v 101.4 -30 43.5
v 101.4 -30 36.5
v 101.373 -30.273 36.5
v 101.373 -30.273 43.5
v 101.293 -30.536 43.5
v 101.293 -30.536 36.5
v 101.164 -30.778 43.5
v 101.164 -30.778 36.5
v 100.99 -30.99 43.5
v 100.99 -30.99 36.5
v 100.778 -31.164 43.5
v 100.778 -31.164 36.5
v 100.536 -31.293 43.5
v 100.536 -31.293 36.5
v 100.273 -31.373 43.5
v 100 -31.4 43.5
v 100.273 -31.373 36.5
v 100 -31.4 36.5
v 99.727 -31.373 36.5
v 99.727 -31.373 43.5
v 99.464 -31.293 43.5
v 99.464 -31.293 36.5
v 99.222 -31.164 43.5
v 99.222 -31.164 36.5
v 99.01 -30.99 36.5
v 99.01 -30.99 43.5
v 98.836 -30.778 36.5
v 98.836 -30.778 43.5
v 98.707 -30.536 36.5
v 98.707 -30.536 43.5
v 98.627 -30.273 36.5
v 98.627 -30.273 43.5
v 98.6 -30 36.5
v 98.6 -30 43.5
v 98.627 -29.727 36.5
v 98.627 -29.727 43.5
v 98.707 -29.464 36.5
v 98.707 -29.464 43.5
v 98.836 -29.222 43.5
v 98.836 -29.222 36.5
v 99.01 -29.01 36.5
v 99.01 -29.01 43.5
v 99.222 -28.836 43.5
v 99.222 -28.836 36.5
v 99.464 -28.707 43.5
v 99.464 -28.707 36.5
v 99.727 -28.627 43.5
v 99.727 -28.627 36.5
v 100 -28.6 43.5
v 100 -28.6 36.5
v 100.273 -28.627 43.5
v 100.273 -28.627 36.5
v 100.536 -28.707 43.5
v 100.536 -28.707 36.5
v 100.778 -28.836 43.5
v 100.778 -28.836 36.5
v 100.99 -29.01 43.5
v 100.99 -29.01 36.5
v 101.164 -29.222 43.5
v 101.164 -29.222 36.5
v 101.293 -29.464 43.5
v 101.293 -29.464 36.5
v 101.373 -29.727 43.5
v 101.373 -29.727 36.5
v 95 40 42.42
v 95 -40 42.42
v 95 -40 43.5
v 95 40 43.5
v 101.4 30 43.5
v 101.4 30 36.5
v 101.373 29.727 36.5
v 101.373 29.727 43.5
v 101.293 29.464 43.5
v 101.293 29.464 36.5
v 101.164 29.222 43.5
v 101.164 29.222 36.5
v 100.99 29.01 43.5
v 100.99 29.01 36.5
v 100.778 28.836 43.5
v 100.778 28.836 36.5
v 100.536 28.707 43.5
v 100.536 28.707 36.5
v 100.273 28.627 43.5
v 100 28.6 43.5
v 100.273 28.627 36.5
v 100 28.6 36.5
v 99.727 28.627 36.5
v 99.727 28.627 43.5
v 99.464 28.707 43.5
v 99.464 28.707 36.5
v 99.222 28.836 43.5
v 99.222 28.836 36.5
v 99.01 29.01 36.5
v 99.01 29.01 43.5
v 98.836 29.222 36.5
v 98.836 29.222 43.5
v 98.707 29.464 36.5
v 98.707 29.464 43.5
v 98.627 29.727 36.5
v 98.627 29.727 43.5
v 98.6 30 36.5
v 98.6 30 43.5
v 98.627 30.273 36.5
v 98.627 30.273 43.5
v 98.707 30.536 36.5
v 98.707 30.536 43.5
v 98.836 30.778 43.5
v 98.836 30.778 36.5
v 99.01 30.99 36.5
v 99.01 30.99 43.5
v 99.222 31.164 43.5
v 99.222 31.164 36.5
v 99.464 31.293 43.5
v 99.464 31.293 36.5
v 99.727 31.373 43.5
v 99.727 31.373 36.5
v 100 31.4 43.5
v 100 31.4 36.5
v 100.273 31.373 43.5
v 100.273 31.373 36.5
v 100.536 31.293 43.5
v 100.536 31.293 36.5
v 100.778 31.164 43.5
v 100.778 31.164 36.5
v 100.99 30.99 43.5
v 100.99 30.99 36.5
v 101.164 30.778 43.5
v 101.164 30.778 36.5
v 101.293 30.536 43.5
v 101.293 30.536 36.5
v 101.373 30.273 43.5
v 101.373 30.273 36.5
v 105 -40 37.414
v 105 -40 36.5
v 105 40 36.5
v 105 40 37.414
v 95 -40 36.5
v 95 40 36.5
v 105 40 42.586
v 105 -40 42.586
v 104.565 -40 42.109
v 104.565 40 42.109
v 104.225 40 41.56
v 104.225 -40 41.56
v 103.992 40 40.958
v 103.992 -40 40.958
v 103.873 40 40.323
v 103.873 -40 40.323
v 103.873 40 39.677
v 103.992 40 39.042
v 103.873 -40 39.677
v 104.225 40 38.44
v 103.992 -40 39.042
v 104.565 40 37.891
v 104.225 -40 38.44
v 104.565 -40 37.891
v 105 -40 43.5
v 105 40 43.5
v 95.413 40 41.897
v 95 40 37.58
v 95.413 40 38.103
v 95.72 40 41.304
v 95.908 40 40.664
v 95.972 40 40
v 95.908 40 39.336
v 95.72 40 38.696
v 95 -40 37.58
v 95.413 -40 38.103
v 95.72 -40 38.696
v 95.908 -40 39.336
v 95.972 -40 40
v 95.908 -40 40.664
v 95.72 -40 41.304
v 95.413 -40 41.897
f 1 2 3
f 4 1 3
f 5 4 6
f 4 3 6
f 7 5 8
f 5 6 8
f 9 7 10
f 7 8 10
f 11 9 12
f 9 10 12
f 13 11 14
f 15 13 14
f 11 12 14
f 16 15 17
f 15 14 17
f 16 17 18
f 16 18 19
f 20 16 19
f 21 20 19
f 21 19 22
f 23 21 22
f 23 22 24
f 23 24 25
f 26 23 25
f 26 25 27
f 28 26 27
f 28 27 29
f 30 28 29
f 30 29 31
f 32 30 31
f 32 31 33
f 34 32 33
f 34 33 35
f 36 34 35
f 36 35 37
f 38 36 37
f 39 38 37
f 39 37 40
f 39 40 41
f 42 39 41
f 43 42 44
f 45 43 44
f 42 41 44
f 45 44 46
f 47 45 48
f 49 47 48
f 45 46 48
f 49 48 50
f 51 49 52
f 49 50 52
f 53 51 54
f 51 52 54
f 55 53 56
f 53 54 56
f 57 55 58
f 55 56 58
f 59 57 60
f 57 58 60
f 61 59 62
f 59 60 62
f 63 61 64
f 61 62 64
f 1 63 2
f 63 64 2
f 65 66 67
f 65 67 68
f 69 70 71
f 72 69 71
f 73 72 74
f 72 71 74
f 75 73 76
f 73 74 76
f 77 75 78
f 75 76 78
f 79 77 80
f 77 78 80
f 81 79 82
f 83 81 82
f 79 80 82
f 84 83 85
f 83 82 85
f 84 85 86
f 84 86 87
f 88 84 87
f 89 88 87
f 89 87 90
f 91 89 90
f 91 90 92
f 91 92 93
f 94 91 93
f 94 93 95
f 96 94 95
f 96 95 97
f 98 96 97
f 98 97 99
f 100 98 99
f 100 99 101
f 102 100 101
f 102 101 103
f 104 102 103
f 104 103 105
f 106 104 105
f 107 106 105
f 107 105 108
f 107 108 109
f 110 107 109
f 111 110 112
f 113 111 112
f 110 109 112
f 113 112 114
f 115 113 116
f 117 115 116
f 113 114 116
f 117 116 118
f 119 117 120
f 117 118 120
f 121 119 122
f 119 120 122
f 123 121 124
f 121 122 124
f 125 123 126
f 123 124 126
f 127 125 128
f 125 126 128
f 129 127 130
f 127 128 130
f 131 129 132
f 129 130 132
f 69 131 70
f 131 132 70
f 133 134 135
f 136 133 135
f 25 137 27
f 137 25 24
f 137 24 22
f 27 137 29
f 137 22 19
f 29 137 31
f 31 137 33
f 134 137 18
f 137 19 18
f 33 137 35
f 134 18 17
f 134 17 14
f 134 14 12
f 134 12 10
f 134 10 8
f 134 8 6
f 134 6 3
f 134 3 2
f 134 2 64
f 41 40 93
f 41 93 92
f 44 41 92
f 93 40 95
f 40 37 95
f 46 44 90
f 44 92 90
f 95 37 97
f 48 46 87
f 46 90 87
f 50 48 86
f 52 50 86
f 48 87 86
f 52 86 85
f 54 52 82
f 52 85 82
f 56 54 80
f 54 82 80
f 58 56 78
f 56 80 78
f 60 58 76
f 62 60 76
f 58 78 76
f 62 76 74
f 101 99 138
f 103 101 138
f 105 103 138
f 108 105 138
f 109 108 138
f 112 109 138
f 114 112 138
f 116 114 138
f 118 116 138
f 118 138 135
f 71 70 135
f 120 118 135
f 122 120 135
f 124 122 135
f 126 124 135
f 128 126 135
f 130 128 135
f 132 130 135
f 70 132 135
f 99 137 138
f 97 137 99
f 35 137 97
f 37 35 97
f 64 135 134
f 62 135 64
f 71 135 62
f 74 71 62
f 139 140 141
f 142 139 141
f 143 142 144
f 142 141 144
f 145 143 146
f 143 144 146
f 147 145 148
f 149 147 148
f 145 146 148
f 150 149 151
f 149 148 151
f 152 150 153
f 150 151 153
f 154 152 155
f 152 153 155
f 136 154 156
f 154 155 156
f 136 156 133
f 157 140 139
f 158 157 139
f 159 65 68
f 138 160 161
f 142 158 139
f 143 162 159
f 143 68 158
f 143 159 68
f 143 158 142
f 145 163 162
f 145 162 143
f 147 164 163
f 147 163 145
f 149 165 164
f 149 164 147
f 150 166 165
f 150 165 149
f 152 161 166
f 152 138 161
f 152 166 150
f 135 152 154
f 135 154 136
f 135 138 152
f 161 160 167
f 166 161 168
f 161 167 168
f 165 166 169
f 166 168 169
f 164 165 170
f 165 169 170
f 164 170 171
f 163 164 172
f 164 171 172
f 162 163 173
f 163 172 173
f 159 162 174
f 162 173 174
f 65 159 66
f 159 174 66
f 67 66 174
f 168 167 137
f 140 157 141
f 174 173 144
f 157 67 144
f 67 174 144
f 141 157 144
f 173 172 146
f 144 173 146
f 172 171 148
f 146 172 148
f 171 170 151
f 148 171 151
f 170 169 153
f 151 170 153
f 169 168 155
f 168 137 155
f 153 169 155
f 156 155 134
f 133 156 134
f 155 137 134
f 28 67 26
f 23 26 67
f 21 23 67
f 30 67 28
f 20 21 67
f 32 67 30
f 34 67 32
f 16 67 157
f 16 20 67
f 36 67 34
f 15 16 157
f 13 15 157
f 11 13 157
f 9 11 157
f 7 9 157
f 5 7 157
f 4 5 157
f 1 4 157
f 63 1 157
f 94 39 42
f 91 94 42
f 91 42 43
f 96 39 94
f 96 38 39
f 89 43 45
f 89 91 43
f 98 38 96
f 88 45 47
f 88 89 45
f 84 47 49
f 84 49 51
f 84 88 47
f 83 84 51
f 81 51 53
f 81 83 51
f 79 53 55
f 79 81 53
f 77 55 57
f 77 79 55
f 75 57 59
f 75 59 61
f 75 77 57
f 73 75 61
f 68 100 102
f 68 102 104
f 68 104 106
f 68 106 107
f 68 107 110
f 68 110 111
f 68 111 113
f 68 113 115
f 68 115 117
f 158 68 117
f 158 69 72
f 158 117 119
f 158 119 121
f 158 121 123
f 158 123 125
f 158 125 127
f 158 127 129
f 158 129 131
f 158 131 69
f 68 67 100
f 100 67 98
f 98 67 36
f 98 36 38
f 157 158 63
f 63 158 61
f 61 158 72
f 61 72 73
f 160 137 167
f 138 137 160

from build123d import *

# Parameters (mm, degrees)
SKETCH045_W     = 10
SKETCH045_H     = 80
PAD018_DEPTH    = 7
SKETCH046_R     = 1.4
POCKET026_DEPTH = 8
SKETCH047_R     = 3.5
POCKET027_DEPTH = 80.001


with BuildPart() as part:
    # Sketch045 → Pad018 (new body)
    with BuildSketch(Plane.XY):
        with Locations((100, 0)):
            Rectangle(SKETCH045_W, SKETCH045_H)
    extrude(amount=PAD018_DEPTH)

    # Sketch046 (on Face5 of Pad018) → Pocket026 (cut)
    with BuildSketch(Plane(origin=(0, 0, 0), x_dir=(1, 0, 0), z_dir=(0, 0, -1))):
        with Locations((100, 30)):
            Circle(SKETCH046_R)
        with Locations((100, -30)):
            Circle(SKETCH046_R)
    extrude(amount=-POCKET026_DEPTH, mode=Mode.SUBTRACT)

    # Sketch047 (on Face6 of Pocket026) → Pocket027 (cut, through all)
    with BuildSketch(Plane.XZ.offset(40)):
        with Locations((107.358391, 3.5)):
            Circle(SKETCH047_R)
        with Locations((92.471756, 3.5)):
            Circle(SKETCH047_R)
    extrude(amount=-POCKET027_DEPTH, mode=Mode.SUBTRACT)


with BuildPart() as part_1:
    # Body006 placement: moved
    add(part.part.moved(Location((0, 0, 36.5))))


solid = part_1.part
